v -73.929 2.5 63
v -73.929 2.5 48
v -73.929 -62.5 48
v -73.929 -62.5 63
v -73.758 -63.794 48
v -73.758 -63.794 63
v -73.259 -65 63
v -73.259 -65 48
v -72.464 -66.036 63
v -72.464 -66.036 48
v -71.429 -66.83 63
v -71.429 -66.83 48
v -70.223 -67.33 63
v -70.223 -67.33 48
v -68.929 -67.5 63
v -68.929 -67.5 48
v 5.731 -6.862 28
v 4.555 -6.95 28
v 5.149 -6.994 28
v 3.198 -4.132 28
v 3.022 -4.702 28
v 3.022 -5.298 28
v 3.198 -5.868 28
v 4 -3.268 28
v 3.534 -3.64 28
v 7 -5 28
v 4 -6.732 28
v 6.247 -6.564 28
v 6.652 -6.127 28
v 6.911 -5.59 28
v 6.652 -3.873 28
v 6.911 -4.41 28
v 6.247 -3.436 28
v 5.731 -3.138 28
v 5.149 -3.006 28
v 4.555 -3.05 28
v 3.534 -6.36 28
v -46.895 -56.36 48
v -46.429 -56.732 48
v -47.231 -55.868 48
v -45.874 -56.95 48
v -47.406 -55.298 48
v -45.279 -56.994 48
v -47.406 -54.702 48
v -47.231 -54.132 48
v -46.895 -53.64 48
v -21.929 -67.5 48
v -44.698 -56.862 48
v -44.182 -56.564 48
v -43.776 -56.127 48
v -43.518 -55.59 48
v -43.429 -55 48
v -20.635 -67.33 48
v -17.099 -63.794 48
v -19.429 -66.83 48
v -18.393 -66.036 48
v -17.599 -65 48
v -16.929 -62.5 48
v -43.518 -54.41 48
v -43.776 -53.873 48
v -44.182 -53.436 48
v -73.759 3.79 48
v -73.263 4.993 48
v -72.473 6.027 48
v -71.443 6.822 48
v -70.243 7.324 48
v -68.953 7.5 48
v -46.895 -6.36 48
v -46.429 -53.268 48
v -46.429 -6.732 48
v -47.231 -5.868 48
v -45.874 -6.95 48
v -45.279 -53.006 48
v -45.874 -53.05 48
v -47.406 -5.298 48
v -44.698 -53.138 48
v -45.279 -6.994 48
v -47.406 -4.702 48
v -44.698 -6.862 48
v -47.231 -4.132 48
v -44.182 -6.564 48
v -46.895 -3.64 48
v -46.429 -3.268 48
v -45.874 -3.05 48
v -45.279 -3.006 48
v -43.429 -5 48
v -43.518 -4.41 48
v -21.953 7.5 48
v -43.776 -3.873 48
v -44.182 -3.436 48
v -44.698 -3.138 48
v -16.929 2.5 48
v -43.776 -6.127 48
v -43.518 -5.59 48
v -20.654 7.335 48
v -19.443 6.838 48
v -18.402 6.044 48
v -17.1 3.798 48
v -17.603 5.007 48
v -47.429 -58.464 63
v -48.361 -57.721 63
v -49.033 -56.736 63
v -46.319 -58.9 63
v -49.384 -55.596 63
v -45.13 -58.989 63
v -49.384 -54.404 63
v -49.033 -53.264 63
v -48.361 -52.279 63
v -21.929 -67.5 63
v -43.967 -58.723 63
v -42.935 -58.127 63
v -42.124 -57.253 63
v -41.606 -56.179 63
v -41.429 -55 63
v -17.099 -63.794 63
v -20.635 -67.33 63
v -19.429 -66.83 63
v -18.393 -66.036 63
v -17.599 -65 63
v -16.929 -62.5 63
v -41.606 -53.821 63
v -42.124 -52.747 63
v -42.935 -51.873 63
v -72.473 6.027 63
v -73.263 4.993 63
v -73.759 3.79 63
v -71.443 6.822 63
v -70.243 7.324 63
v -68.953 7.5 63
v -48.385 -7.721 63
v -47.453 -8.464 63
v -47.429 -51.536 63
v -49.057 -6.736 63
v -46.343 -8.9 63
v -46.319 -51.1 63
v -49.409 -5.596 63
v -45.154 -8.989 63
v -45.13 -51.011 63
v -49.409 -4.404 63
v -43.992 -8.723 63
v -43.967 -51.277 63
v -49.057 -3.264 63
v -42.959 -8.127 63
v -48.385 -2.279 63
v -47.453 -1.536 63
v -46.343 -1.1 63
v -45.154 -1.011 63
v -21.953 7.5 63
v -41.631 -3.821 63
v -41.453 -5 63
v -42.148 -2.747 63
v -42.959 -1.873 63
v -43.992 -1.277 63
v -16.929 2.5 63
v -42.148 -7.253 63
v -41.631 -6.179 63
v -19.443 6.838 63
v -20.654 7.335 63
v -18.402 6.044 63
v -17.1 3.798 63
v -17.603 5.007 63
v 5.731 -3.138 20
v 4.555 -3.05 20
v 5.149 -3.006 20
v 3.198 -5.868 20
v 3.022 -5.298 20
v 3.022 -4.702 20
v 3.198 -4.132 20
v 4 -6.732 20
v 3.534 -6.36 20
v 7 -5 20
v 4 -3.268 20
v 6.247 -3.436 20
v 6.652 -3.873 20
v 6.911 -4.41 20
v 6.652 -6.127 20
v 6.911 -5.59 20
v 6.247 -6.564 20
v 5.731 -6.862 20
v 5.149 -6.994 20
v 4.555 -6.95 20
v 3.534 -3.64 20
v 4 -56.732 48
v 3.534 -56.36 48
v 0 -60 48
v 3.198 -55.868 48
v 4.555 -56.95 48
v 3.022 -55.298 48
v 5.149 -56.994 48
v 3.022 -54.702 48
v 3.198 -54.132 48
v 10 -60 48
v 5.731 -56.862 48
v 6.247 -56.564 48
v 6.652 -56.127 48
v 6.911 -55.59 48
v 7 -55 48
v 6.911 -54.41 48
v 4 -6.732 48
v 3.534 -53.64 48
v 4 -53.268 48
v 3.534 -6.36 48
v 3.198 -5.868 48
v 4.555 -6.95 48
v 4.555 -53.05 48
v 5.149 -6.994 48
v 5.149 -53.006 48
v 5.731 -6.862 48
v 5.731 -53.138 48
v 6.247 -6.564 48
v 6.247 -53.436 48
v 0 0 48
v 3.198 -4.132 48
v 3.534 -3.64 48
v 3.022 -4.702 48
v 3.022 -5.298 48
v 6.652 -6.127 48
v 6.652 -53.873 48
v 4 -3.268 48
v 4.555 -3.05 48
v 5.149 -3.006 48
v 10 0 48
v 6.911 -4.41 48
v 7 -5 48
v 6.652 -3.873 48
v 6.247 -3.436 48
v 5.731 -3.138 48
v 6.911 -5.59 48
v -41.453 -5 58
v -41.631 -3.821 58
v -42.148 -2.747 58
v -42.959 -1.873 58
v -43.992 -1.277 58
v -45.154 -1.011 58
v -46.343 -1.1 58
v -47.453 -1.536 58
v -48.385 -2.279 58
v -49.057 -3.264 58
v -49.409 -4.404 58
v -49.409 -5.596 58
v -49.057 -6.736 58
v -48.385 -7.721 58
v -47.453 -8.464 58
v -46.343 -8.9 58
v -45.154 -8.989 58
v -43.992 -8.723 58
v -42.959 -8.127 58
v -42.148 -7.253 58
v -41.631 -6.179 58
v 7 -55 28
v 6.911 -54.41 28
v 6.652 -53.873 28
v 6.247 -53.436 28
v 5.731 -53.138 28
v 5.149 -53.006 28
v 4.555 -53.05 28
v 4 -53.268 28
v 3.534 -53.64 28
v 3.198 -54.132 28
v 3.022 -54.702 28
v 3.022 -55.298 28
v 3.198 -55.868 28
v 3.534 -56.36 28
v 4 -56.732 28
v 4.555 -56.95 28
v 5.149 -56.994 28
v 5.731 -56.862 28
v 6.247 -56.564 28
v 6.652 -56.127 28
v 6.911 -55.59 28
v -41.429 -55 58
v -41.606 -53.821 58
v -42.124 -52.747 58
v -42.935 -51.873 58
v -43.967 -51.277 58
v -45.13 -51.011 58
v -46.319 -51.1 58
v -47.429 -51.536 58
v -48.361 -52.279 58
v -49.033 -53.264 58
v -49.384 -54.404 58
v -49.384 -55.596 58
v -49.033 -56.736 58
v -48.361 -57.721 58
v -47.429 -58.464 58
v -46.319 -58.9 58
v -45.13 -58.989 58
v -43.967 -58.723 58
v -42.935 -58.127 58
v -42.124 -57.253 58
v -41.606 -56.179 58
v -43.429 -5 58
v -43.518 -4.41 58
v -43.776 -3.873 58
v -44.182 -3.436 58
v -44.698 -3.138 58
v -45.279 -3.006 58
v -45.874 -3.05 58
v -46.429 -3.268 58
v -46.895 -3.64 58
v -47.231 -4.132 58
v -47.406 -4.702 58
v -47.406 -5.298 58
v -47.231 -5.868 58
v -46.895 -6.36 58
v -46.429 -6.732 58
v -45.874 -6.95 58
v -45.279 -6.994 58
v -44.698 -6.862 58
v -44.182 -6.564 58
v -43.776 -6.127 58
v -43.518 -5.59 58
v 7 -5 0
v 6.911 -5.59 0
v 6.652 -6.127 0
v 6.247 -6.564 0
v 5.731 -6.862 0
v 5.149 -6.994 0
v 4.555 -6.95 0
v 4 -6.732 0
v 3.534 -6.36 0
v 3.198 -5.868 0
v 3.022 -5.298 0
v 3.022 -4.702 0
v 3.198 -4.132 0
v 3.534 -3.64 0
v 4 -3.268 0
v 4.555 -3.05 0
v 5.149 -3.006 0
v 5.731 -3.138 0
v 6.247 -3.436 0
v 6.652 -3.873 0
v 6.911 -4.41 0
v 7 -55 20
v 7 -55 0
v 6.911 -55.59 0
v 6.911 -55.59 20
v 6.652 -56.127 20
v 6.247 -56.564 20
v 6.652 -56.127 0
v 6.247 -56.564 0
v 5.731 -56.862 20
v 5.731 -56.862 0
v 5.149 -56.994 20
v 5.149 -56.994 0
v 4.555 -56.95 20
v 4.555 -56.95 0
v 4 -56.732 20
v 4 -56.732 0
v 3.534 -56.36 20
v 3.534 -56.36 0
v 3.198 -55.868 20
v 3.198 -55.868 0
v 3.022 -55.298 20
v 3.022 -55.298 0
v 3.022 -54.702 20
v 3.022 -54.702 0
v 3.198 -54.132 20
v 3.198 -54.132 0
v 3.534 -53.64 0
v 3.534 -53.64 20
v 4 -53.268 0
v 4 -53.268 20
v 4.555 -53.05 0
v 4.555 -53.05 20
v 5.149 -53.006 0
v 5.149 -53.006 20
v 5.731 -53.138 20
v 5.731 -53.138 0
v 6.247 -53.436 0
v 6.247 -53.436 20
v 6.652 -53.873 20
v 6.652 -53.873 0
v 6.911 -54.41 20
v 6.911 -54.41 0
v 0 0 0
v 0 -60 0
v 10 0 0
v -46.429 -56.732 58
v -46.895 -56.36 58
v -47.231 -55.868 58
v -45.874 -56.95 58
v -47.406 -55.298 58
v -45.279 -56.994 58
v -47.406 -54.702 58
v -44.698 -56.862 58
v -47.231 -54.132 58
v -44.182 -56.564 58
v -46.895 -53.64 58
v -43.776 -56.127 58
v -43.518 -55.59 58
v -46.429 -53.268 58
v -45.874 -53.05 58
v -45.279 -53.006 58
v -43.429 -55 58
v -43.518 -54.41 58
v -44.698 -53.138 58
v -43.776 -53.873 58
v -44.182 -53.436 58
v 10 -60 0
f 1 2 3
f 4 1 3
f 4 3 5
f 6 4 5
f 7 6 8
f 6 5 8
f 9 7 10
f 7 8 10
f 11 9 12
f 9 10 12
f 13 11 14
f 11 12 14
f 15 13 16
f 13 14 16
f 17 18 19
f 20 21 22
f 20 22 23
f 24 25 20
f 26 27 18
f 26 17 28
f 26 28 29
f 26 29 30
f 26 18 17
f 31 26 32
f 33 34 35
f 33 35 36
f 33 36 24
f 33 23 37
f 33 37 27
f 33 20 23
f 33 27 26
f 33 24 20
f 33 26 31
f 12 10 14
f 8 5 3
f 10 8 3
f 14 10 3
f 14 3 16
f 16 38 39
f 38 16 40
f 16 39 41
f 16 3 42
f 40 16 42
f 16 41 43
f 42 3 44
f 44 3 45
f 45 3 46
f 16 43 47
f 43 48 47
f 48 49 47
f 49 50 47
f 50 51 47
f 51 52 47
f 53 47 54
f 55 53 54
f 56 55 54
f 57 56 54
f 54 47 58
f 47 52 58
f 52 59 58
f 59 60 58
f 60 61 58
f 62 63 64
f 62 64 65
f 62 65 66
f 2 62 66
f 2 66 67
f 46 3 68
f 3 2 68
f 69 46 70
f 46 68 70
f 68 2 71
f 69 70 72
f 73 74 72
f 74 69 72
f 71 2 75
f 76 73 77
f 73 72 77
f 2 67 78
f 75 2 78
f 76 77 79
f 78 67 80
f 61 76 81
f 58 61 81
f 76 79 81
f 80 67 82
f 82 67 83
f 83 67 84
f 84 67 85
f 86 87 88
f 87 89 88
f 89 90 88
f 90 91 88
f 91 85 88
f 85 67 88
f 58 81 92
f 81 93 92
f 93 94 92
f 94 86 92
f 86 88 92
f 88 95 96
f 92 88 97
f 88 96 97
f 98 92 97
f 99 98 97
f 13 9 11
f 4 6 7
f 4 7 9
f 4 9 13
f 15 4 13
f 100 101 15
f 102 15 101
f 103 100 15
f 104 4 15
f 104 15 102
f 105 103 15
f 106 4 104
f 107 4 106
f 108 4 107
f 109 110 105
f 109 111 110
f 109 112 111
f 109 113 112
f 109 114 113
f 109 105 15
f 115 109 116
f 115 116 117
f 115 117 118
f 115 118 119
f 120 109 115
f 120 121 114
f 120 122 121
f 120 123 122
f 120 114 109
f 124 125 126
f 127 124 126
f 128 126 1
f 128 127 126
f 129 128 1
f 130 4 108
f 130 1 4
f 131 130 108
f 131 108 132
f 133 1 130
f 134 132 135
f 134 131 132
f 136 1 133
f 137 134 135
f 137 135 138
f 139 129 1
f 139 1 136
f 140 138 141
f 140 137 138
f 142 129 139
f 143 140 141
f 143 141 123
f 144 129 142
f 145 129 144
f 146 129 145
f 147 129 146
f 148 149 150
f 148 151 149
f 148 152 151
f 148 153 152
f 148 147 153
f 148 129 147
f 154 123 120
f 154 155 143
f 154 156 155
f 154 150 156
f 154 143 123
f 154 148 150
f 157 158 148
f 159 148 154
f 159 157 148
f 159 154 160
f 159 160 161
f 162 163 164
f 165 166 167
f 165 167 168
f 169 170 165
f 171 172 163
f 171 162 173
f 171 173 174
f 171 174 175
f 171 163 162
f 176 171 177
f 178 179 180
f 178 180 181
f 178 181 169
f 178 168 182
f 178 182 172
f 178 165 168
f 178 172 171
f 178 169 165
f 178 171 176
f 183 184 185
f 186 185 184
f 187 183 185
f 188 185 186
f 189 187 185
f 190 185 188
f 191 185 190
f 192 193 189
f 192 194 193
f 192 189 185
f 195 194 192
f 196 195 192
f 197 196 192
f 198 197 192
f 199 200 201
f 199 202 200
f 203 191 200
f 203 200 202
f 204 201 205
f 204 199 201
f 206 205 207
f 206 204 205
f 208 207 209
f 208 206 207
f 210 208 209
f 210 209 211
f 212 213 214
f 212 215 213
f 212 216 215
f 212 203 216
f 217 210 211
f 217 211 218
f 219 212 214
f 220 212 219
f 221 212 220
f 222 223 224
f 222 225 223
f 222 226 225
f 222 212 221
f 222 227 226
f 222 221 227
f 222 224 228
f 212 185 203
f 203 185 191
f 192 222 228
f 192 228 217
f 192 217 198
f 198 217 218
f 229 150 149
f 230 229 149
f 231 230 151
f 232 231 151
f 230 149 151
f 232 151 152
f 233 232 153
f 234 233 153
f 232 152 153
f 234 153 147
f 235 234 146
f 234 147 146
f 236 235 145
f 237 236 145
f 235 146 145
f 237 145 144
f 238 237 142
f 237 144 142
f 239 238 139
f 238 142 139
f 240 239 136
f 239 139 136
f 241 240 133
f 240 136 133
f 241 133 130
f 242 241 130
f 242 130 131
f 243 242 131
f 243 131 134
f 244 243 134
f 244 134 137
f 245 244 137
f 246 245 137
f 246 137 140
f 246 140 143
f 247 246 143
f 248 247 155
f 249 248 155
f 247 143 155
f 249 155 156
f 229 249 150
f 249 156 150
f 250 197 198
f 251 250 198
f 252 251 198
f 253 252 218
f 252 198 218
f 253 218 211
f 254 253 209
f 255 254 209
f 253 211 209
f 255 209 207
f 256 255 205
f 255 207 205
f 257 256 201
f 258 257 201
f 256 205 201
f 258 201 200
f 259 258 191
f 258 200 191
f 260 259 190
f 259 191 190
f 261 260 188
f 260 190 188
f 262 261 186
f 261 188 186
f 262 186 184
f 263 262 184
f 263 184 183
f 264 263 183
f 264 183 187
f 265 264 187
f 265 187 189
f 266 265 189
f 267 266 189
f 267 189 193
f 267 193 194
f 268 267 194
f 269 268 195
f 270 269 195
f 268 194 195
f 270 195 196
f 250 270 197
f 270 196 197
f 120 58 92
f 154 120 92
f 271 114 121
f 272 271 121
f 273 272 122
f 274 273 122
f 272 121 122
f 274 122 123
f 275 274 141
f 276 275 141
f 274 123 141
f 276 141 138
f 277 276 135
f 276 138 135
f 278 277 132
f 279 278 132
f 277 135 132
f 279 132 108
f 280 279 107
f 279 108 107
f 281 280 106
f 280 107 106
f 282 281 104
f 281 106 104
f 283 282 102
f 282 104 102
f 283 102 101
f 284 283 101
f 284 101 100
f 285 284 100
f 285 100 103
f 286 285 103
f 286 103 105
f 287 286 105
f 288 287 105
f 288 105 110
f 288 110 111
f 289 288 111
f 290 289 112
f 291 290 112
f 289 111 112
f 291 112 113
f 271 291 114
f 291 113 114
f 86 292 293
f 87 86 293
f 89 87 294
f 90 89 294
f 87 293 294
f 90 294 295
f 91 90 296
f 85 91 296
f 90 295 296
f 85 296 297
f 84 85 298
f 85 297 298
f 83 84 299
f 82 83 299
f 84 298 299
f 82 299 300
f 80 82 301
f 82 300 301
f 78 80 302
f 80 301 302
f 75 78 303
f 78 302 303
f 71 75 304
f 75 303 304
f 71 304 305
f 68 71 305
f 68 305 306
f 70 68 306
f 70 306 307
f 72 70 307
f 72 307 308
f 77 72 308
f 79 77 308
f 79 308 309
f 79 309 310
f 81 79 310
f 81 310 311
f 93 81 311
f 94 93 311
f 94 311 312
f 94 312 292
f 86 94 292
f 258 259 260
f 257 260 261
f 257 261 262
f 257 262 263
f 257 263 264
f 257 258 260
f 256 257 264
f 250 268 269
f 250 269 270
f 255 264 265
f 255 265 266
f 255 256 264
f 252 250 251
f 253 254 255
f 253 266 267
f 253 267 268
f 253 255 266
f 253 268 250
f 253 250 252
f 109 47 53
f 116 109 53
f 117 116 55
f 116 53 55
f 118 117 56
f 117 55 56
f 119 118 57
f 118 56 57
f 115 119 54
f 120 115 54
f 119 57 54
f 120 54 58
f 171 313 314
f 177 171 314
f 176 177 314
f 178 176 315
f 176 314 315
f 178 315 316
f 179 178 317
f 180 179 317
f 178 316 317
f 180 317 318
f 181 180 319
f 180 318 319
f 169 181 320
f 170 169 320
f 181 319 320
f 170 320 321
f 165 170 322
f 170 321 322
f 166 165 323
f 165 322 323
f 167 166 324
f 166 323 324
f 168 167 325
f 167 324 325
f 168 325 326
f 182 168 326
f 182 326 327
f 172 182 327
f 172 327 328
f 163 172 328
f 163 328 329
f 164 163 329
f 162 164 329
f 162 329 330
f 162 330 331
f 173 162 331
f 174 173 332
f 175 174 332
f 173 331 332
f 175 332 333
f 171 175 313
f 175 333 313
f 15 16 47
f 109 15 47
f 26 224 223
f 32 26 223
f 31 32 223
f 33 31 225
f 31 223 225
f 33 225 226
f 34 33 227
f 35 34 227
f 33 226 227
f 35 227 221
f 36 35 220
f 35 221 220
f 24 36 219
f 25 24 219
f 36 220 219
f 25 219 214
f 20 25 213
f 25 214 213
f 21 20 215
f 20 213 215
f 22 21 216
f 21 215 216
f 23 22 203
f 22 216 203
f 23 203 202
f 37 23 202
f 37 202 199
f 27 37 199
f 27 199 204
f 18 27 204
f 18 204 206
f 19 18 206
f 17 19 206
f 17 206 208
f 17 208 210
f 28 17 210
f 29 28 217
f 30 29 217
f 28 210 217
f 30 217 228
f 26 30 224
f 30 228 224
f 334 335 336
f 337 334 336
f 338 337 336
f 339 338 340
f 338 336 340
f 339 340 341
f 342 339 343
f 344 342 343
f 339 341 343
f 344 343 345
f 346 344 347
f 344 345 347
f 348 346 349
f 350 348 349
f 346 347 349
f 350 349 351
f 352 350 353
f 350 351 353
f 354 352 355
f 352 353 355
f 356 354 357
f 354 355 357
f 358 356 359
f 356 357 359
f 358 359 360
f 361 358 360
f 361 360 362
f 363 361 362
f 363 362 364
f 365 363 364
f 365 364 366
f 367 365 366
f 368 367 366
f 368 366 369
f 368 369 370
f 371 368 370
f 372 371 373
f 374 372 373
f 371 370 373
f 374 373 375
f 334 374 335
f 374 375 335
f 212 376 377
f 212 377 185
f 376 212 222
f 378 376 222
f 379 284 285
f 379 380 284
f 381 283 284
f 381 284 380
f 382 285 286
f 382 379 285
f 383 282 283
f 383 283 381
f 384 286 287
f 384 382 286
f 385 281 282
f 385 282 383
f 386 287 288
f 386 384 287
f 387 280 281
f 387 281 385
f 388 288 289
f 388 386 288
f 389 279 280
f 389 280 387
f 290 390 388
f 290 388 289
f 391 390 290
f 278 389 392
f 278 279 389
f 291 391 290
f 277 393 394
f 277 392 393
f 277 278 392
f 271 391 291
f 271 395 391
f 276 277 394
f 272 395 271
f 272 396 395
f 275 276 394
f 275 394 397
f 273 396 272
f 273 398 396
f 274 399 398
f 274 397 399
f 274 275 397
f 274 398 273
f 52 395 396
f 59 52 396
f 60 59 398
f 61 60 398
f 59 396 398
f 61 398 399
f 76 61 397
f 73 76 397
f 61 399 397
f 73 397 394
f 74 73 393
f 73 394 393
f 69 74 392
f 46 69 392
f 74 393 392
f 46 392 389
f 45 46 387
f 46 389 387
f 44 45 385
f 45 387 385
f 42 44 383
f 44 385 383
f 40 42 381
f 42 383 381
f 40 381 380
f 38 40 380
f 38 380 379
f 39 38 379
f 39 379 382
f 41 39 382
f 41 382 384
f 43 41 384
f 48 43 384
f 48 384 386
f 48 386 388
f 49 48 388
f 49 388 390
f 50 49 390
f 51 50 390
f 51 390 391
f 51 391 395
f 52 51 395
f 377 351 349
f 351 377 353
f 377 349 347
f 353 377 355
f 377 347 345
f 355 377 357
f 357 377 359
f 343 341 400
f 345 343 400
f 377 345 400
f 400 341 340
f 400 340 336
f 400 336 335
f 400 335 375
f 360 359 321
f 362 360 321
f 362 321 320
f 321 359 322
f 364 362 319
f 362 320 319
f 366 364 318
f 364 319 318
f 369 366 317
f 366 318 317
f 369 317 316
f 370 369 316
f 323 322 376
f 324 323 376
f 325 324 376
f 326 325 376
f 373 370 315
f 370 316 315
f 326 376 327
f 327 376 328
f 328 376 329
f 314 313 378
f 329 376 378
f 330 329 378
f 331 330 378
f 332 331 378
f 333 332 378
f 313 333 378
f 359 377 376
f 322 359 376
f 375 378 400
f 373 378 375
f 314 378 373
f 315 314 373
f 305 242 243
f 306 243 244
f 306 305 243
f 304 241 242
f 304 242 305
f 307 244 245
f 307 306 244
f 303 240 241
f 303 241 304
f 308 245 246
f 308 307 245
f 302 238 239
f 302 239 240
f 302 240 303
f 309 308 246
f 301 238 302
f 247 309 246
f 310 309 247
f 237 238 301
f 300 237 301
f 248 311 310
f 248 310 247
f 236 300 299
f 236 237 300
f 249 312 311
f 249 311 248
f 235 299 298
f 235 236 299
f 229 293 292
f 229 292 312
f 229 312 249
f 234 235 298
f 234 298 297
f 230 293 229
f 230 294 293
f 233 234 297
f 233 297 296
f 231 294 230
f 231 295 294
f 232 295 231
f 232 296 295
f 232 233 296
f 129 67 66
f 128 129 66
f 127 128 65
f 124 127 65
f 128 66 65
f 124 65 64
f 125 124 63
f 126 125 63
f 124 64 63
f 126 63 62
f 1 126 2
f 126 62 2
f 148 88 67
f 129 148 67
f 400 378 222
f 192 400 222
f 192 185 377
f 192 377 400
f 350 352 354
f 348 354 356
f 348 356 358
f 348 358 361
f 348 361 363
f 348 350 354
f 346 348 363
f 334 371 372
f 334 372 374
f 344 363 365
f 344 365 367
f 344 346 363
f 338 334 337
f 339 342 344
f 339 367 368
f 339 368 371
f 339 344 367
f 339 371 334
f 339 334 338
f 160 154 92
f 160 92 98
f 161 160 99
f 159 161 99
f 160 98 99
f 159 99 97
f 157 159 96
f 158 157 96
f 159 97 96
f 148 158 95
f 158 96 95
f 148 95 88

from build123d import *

# Parameters (mm, degrees)
F0_W     = 10
F0_H     = 48
F1_DEPTH = 60
F2_R     = 2
F3_DEPTH = 20
F4_R     = 2
F5_DEPTH = 20
F6_DEPTH = 15
F7_R     = 2
F8_DEPTH = 63.001
F7_R_2   = 4
F9_DEPTH = 5


with BuildPart() as f1:
    # F0 (on Front) → F1 (new body)
    with BuildSketch(Plane.XZ):
        with Locations((5, 24)):
            Rectangle(F0_W, F0_H)
    extrude(amount=F1_DEPTH)

    # F2 (on face) → F3 (cut)
    with BuildSketch(Plane(origin=(0, 0, 0), x_dir=(1, 0, 0), z_dir=(0, 0, -1))):
        with Locations((5, 55)):
            Circle(F2_R)
        with Locations((5, 5)):
            Circle(F2_R)
    extrude(amount=-F3_DEPTH, mode=Mode.SUBTRACT)

    # F4 (on face) → F5 (cut)
    with BuildSketch(Plane.XY.offset(48)):
        with Locations((5, -5)):
            Circle(F4_R)
        with Locations((5, -55)):
            Circle(F4_R)
        with BuildLine():
            ThreePointArc((-73.928772, -62.5), (-72.464305, -66.035534), (-68.928772, -67.5))
            Line((-68.928772, -67.5), (-21.928772, -67.5))
            ThreePointArc((-21.928772, -67.5), (-18.393238, -66.035534), (-16.928772, -62.5))
            Line((-16.928772, -62.5), (-16.928772, -30))
            Line((-16.928772, -30), (-16.928772, 2.50006))
            ThreePointArc((-16.928772, 2.50006), (-18.401898, 6.044233), (-21.953236, 7.5))
            Line((-21.953236, 7.5), (-68.953236, 7.5))
            ThreePointArc((-68.953236, 7.5), (-72.472944, 6.026934), (-73.928772, 2.50006))
            Line((-73.928772, 2.50006), (-73.928772, -62.5))
        make_face()
    extrude(amount=-F5_DEPTH, mode=Mode.SUBTRACT)


with BuildPart() as f6:
    # F4 (on face) → F6 (new body)
    with BuildSketch(Plane.XY.offset(48)):
        with BuildLine():
            ThreePointArc((-73.928772, -62.5), (-72.464305, -66.035534), (-68.928772, -67.5))
            Line((-68.928772, -67.5), (-21.928772, -67.5))
            ThreePointArc((-21.928772, -67.5), (-18.393238, -66.035534), (-16.928772, -62.5))
            Line((-16.928772, -62.5), (-16.928772, -30))
            Line((-16.928772, -30), (-16.928772, 2.50006))
            ThreePointArc((-16.928772, 2.50006), (-18.401898, 6.044233), (-21.953236, 7.5))
            Line((-21.953236, 7.5), (-68.953236, 7.5))
            ThreePointArc((-68.953236, 7.5), (-72.472944, 6.026934), (-73.928772, 2.50006))
            Line((-73.928772, 2.50006), (-73.928772, -62.5))
        make_face()
    extrude(amount=F6_DEPTH)

    # F7 (on face) → F8 (cut, through all)
    with BuildSketch(Plane.XY.offset(63)):
        with Locations((-45.428772, -55)):
            Circle(F7_R)
        with Locations((-45.428772, -5)):
            Circle(F7_R)
    extrude(amount=-F8_DEPTH, mode=Mode.SUBTRACT)

    # F7 (on face) → F9 (cut)
    with BuildSketch(Plane.XY.offset(63)):
        with Locations((-45.453236, -5)):
            Circle(F7_R_2)
        with Locations((-45.428772, -5)):
            Circle(F7_R, mode=Mode.SUBTRACT)
        with Locations((-45.428772, -55)):
            Circle(F7_R_2)
        with Locations((-45.428772, -55)):
            Circle(F7_R, mode=Mode.SUBTRACT)
    extrude(amount=-F9_DEPTH, mode=Mode.SUBTRACT)


solid = Compound([f1.part, f6.part])
